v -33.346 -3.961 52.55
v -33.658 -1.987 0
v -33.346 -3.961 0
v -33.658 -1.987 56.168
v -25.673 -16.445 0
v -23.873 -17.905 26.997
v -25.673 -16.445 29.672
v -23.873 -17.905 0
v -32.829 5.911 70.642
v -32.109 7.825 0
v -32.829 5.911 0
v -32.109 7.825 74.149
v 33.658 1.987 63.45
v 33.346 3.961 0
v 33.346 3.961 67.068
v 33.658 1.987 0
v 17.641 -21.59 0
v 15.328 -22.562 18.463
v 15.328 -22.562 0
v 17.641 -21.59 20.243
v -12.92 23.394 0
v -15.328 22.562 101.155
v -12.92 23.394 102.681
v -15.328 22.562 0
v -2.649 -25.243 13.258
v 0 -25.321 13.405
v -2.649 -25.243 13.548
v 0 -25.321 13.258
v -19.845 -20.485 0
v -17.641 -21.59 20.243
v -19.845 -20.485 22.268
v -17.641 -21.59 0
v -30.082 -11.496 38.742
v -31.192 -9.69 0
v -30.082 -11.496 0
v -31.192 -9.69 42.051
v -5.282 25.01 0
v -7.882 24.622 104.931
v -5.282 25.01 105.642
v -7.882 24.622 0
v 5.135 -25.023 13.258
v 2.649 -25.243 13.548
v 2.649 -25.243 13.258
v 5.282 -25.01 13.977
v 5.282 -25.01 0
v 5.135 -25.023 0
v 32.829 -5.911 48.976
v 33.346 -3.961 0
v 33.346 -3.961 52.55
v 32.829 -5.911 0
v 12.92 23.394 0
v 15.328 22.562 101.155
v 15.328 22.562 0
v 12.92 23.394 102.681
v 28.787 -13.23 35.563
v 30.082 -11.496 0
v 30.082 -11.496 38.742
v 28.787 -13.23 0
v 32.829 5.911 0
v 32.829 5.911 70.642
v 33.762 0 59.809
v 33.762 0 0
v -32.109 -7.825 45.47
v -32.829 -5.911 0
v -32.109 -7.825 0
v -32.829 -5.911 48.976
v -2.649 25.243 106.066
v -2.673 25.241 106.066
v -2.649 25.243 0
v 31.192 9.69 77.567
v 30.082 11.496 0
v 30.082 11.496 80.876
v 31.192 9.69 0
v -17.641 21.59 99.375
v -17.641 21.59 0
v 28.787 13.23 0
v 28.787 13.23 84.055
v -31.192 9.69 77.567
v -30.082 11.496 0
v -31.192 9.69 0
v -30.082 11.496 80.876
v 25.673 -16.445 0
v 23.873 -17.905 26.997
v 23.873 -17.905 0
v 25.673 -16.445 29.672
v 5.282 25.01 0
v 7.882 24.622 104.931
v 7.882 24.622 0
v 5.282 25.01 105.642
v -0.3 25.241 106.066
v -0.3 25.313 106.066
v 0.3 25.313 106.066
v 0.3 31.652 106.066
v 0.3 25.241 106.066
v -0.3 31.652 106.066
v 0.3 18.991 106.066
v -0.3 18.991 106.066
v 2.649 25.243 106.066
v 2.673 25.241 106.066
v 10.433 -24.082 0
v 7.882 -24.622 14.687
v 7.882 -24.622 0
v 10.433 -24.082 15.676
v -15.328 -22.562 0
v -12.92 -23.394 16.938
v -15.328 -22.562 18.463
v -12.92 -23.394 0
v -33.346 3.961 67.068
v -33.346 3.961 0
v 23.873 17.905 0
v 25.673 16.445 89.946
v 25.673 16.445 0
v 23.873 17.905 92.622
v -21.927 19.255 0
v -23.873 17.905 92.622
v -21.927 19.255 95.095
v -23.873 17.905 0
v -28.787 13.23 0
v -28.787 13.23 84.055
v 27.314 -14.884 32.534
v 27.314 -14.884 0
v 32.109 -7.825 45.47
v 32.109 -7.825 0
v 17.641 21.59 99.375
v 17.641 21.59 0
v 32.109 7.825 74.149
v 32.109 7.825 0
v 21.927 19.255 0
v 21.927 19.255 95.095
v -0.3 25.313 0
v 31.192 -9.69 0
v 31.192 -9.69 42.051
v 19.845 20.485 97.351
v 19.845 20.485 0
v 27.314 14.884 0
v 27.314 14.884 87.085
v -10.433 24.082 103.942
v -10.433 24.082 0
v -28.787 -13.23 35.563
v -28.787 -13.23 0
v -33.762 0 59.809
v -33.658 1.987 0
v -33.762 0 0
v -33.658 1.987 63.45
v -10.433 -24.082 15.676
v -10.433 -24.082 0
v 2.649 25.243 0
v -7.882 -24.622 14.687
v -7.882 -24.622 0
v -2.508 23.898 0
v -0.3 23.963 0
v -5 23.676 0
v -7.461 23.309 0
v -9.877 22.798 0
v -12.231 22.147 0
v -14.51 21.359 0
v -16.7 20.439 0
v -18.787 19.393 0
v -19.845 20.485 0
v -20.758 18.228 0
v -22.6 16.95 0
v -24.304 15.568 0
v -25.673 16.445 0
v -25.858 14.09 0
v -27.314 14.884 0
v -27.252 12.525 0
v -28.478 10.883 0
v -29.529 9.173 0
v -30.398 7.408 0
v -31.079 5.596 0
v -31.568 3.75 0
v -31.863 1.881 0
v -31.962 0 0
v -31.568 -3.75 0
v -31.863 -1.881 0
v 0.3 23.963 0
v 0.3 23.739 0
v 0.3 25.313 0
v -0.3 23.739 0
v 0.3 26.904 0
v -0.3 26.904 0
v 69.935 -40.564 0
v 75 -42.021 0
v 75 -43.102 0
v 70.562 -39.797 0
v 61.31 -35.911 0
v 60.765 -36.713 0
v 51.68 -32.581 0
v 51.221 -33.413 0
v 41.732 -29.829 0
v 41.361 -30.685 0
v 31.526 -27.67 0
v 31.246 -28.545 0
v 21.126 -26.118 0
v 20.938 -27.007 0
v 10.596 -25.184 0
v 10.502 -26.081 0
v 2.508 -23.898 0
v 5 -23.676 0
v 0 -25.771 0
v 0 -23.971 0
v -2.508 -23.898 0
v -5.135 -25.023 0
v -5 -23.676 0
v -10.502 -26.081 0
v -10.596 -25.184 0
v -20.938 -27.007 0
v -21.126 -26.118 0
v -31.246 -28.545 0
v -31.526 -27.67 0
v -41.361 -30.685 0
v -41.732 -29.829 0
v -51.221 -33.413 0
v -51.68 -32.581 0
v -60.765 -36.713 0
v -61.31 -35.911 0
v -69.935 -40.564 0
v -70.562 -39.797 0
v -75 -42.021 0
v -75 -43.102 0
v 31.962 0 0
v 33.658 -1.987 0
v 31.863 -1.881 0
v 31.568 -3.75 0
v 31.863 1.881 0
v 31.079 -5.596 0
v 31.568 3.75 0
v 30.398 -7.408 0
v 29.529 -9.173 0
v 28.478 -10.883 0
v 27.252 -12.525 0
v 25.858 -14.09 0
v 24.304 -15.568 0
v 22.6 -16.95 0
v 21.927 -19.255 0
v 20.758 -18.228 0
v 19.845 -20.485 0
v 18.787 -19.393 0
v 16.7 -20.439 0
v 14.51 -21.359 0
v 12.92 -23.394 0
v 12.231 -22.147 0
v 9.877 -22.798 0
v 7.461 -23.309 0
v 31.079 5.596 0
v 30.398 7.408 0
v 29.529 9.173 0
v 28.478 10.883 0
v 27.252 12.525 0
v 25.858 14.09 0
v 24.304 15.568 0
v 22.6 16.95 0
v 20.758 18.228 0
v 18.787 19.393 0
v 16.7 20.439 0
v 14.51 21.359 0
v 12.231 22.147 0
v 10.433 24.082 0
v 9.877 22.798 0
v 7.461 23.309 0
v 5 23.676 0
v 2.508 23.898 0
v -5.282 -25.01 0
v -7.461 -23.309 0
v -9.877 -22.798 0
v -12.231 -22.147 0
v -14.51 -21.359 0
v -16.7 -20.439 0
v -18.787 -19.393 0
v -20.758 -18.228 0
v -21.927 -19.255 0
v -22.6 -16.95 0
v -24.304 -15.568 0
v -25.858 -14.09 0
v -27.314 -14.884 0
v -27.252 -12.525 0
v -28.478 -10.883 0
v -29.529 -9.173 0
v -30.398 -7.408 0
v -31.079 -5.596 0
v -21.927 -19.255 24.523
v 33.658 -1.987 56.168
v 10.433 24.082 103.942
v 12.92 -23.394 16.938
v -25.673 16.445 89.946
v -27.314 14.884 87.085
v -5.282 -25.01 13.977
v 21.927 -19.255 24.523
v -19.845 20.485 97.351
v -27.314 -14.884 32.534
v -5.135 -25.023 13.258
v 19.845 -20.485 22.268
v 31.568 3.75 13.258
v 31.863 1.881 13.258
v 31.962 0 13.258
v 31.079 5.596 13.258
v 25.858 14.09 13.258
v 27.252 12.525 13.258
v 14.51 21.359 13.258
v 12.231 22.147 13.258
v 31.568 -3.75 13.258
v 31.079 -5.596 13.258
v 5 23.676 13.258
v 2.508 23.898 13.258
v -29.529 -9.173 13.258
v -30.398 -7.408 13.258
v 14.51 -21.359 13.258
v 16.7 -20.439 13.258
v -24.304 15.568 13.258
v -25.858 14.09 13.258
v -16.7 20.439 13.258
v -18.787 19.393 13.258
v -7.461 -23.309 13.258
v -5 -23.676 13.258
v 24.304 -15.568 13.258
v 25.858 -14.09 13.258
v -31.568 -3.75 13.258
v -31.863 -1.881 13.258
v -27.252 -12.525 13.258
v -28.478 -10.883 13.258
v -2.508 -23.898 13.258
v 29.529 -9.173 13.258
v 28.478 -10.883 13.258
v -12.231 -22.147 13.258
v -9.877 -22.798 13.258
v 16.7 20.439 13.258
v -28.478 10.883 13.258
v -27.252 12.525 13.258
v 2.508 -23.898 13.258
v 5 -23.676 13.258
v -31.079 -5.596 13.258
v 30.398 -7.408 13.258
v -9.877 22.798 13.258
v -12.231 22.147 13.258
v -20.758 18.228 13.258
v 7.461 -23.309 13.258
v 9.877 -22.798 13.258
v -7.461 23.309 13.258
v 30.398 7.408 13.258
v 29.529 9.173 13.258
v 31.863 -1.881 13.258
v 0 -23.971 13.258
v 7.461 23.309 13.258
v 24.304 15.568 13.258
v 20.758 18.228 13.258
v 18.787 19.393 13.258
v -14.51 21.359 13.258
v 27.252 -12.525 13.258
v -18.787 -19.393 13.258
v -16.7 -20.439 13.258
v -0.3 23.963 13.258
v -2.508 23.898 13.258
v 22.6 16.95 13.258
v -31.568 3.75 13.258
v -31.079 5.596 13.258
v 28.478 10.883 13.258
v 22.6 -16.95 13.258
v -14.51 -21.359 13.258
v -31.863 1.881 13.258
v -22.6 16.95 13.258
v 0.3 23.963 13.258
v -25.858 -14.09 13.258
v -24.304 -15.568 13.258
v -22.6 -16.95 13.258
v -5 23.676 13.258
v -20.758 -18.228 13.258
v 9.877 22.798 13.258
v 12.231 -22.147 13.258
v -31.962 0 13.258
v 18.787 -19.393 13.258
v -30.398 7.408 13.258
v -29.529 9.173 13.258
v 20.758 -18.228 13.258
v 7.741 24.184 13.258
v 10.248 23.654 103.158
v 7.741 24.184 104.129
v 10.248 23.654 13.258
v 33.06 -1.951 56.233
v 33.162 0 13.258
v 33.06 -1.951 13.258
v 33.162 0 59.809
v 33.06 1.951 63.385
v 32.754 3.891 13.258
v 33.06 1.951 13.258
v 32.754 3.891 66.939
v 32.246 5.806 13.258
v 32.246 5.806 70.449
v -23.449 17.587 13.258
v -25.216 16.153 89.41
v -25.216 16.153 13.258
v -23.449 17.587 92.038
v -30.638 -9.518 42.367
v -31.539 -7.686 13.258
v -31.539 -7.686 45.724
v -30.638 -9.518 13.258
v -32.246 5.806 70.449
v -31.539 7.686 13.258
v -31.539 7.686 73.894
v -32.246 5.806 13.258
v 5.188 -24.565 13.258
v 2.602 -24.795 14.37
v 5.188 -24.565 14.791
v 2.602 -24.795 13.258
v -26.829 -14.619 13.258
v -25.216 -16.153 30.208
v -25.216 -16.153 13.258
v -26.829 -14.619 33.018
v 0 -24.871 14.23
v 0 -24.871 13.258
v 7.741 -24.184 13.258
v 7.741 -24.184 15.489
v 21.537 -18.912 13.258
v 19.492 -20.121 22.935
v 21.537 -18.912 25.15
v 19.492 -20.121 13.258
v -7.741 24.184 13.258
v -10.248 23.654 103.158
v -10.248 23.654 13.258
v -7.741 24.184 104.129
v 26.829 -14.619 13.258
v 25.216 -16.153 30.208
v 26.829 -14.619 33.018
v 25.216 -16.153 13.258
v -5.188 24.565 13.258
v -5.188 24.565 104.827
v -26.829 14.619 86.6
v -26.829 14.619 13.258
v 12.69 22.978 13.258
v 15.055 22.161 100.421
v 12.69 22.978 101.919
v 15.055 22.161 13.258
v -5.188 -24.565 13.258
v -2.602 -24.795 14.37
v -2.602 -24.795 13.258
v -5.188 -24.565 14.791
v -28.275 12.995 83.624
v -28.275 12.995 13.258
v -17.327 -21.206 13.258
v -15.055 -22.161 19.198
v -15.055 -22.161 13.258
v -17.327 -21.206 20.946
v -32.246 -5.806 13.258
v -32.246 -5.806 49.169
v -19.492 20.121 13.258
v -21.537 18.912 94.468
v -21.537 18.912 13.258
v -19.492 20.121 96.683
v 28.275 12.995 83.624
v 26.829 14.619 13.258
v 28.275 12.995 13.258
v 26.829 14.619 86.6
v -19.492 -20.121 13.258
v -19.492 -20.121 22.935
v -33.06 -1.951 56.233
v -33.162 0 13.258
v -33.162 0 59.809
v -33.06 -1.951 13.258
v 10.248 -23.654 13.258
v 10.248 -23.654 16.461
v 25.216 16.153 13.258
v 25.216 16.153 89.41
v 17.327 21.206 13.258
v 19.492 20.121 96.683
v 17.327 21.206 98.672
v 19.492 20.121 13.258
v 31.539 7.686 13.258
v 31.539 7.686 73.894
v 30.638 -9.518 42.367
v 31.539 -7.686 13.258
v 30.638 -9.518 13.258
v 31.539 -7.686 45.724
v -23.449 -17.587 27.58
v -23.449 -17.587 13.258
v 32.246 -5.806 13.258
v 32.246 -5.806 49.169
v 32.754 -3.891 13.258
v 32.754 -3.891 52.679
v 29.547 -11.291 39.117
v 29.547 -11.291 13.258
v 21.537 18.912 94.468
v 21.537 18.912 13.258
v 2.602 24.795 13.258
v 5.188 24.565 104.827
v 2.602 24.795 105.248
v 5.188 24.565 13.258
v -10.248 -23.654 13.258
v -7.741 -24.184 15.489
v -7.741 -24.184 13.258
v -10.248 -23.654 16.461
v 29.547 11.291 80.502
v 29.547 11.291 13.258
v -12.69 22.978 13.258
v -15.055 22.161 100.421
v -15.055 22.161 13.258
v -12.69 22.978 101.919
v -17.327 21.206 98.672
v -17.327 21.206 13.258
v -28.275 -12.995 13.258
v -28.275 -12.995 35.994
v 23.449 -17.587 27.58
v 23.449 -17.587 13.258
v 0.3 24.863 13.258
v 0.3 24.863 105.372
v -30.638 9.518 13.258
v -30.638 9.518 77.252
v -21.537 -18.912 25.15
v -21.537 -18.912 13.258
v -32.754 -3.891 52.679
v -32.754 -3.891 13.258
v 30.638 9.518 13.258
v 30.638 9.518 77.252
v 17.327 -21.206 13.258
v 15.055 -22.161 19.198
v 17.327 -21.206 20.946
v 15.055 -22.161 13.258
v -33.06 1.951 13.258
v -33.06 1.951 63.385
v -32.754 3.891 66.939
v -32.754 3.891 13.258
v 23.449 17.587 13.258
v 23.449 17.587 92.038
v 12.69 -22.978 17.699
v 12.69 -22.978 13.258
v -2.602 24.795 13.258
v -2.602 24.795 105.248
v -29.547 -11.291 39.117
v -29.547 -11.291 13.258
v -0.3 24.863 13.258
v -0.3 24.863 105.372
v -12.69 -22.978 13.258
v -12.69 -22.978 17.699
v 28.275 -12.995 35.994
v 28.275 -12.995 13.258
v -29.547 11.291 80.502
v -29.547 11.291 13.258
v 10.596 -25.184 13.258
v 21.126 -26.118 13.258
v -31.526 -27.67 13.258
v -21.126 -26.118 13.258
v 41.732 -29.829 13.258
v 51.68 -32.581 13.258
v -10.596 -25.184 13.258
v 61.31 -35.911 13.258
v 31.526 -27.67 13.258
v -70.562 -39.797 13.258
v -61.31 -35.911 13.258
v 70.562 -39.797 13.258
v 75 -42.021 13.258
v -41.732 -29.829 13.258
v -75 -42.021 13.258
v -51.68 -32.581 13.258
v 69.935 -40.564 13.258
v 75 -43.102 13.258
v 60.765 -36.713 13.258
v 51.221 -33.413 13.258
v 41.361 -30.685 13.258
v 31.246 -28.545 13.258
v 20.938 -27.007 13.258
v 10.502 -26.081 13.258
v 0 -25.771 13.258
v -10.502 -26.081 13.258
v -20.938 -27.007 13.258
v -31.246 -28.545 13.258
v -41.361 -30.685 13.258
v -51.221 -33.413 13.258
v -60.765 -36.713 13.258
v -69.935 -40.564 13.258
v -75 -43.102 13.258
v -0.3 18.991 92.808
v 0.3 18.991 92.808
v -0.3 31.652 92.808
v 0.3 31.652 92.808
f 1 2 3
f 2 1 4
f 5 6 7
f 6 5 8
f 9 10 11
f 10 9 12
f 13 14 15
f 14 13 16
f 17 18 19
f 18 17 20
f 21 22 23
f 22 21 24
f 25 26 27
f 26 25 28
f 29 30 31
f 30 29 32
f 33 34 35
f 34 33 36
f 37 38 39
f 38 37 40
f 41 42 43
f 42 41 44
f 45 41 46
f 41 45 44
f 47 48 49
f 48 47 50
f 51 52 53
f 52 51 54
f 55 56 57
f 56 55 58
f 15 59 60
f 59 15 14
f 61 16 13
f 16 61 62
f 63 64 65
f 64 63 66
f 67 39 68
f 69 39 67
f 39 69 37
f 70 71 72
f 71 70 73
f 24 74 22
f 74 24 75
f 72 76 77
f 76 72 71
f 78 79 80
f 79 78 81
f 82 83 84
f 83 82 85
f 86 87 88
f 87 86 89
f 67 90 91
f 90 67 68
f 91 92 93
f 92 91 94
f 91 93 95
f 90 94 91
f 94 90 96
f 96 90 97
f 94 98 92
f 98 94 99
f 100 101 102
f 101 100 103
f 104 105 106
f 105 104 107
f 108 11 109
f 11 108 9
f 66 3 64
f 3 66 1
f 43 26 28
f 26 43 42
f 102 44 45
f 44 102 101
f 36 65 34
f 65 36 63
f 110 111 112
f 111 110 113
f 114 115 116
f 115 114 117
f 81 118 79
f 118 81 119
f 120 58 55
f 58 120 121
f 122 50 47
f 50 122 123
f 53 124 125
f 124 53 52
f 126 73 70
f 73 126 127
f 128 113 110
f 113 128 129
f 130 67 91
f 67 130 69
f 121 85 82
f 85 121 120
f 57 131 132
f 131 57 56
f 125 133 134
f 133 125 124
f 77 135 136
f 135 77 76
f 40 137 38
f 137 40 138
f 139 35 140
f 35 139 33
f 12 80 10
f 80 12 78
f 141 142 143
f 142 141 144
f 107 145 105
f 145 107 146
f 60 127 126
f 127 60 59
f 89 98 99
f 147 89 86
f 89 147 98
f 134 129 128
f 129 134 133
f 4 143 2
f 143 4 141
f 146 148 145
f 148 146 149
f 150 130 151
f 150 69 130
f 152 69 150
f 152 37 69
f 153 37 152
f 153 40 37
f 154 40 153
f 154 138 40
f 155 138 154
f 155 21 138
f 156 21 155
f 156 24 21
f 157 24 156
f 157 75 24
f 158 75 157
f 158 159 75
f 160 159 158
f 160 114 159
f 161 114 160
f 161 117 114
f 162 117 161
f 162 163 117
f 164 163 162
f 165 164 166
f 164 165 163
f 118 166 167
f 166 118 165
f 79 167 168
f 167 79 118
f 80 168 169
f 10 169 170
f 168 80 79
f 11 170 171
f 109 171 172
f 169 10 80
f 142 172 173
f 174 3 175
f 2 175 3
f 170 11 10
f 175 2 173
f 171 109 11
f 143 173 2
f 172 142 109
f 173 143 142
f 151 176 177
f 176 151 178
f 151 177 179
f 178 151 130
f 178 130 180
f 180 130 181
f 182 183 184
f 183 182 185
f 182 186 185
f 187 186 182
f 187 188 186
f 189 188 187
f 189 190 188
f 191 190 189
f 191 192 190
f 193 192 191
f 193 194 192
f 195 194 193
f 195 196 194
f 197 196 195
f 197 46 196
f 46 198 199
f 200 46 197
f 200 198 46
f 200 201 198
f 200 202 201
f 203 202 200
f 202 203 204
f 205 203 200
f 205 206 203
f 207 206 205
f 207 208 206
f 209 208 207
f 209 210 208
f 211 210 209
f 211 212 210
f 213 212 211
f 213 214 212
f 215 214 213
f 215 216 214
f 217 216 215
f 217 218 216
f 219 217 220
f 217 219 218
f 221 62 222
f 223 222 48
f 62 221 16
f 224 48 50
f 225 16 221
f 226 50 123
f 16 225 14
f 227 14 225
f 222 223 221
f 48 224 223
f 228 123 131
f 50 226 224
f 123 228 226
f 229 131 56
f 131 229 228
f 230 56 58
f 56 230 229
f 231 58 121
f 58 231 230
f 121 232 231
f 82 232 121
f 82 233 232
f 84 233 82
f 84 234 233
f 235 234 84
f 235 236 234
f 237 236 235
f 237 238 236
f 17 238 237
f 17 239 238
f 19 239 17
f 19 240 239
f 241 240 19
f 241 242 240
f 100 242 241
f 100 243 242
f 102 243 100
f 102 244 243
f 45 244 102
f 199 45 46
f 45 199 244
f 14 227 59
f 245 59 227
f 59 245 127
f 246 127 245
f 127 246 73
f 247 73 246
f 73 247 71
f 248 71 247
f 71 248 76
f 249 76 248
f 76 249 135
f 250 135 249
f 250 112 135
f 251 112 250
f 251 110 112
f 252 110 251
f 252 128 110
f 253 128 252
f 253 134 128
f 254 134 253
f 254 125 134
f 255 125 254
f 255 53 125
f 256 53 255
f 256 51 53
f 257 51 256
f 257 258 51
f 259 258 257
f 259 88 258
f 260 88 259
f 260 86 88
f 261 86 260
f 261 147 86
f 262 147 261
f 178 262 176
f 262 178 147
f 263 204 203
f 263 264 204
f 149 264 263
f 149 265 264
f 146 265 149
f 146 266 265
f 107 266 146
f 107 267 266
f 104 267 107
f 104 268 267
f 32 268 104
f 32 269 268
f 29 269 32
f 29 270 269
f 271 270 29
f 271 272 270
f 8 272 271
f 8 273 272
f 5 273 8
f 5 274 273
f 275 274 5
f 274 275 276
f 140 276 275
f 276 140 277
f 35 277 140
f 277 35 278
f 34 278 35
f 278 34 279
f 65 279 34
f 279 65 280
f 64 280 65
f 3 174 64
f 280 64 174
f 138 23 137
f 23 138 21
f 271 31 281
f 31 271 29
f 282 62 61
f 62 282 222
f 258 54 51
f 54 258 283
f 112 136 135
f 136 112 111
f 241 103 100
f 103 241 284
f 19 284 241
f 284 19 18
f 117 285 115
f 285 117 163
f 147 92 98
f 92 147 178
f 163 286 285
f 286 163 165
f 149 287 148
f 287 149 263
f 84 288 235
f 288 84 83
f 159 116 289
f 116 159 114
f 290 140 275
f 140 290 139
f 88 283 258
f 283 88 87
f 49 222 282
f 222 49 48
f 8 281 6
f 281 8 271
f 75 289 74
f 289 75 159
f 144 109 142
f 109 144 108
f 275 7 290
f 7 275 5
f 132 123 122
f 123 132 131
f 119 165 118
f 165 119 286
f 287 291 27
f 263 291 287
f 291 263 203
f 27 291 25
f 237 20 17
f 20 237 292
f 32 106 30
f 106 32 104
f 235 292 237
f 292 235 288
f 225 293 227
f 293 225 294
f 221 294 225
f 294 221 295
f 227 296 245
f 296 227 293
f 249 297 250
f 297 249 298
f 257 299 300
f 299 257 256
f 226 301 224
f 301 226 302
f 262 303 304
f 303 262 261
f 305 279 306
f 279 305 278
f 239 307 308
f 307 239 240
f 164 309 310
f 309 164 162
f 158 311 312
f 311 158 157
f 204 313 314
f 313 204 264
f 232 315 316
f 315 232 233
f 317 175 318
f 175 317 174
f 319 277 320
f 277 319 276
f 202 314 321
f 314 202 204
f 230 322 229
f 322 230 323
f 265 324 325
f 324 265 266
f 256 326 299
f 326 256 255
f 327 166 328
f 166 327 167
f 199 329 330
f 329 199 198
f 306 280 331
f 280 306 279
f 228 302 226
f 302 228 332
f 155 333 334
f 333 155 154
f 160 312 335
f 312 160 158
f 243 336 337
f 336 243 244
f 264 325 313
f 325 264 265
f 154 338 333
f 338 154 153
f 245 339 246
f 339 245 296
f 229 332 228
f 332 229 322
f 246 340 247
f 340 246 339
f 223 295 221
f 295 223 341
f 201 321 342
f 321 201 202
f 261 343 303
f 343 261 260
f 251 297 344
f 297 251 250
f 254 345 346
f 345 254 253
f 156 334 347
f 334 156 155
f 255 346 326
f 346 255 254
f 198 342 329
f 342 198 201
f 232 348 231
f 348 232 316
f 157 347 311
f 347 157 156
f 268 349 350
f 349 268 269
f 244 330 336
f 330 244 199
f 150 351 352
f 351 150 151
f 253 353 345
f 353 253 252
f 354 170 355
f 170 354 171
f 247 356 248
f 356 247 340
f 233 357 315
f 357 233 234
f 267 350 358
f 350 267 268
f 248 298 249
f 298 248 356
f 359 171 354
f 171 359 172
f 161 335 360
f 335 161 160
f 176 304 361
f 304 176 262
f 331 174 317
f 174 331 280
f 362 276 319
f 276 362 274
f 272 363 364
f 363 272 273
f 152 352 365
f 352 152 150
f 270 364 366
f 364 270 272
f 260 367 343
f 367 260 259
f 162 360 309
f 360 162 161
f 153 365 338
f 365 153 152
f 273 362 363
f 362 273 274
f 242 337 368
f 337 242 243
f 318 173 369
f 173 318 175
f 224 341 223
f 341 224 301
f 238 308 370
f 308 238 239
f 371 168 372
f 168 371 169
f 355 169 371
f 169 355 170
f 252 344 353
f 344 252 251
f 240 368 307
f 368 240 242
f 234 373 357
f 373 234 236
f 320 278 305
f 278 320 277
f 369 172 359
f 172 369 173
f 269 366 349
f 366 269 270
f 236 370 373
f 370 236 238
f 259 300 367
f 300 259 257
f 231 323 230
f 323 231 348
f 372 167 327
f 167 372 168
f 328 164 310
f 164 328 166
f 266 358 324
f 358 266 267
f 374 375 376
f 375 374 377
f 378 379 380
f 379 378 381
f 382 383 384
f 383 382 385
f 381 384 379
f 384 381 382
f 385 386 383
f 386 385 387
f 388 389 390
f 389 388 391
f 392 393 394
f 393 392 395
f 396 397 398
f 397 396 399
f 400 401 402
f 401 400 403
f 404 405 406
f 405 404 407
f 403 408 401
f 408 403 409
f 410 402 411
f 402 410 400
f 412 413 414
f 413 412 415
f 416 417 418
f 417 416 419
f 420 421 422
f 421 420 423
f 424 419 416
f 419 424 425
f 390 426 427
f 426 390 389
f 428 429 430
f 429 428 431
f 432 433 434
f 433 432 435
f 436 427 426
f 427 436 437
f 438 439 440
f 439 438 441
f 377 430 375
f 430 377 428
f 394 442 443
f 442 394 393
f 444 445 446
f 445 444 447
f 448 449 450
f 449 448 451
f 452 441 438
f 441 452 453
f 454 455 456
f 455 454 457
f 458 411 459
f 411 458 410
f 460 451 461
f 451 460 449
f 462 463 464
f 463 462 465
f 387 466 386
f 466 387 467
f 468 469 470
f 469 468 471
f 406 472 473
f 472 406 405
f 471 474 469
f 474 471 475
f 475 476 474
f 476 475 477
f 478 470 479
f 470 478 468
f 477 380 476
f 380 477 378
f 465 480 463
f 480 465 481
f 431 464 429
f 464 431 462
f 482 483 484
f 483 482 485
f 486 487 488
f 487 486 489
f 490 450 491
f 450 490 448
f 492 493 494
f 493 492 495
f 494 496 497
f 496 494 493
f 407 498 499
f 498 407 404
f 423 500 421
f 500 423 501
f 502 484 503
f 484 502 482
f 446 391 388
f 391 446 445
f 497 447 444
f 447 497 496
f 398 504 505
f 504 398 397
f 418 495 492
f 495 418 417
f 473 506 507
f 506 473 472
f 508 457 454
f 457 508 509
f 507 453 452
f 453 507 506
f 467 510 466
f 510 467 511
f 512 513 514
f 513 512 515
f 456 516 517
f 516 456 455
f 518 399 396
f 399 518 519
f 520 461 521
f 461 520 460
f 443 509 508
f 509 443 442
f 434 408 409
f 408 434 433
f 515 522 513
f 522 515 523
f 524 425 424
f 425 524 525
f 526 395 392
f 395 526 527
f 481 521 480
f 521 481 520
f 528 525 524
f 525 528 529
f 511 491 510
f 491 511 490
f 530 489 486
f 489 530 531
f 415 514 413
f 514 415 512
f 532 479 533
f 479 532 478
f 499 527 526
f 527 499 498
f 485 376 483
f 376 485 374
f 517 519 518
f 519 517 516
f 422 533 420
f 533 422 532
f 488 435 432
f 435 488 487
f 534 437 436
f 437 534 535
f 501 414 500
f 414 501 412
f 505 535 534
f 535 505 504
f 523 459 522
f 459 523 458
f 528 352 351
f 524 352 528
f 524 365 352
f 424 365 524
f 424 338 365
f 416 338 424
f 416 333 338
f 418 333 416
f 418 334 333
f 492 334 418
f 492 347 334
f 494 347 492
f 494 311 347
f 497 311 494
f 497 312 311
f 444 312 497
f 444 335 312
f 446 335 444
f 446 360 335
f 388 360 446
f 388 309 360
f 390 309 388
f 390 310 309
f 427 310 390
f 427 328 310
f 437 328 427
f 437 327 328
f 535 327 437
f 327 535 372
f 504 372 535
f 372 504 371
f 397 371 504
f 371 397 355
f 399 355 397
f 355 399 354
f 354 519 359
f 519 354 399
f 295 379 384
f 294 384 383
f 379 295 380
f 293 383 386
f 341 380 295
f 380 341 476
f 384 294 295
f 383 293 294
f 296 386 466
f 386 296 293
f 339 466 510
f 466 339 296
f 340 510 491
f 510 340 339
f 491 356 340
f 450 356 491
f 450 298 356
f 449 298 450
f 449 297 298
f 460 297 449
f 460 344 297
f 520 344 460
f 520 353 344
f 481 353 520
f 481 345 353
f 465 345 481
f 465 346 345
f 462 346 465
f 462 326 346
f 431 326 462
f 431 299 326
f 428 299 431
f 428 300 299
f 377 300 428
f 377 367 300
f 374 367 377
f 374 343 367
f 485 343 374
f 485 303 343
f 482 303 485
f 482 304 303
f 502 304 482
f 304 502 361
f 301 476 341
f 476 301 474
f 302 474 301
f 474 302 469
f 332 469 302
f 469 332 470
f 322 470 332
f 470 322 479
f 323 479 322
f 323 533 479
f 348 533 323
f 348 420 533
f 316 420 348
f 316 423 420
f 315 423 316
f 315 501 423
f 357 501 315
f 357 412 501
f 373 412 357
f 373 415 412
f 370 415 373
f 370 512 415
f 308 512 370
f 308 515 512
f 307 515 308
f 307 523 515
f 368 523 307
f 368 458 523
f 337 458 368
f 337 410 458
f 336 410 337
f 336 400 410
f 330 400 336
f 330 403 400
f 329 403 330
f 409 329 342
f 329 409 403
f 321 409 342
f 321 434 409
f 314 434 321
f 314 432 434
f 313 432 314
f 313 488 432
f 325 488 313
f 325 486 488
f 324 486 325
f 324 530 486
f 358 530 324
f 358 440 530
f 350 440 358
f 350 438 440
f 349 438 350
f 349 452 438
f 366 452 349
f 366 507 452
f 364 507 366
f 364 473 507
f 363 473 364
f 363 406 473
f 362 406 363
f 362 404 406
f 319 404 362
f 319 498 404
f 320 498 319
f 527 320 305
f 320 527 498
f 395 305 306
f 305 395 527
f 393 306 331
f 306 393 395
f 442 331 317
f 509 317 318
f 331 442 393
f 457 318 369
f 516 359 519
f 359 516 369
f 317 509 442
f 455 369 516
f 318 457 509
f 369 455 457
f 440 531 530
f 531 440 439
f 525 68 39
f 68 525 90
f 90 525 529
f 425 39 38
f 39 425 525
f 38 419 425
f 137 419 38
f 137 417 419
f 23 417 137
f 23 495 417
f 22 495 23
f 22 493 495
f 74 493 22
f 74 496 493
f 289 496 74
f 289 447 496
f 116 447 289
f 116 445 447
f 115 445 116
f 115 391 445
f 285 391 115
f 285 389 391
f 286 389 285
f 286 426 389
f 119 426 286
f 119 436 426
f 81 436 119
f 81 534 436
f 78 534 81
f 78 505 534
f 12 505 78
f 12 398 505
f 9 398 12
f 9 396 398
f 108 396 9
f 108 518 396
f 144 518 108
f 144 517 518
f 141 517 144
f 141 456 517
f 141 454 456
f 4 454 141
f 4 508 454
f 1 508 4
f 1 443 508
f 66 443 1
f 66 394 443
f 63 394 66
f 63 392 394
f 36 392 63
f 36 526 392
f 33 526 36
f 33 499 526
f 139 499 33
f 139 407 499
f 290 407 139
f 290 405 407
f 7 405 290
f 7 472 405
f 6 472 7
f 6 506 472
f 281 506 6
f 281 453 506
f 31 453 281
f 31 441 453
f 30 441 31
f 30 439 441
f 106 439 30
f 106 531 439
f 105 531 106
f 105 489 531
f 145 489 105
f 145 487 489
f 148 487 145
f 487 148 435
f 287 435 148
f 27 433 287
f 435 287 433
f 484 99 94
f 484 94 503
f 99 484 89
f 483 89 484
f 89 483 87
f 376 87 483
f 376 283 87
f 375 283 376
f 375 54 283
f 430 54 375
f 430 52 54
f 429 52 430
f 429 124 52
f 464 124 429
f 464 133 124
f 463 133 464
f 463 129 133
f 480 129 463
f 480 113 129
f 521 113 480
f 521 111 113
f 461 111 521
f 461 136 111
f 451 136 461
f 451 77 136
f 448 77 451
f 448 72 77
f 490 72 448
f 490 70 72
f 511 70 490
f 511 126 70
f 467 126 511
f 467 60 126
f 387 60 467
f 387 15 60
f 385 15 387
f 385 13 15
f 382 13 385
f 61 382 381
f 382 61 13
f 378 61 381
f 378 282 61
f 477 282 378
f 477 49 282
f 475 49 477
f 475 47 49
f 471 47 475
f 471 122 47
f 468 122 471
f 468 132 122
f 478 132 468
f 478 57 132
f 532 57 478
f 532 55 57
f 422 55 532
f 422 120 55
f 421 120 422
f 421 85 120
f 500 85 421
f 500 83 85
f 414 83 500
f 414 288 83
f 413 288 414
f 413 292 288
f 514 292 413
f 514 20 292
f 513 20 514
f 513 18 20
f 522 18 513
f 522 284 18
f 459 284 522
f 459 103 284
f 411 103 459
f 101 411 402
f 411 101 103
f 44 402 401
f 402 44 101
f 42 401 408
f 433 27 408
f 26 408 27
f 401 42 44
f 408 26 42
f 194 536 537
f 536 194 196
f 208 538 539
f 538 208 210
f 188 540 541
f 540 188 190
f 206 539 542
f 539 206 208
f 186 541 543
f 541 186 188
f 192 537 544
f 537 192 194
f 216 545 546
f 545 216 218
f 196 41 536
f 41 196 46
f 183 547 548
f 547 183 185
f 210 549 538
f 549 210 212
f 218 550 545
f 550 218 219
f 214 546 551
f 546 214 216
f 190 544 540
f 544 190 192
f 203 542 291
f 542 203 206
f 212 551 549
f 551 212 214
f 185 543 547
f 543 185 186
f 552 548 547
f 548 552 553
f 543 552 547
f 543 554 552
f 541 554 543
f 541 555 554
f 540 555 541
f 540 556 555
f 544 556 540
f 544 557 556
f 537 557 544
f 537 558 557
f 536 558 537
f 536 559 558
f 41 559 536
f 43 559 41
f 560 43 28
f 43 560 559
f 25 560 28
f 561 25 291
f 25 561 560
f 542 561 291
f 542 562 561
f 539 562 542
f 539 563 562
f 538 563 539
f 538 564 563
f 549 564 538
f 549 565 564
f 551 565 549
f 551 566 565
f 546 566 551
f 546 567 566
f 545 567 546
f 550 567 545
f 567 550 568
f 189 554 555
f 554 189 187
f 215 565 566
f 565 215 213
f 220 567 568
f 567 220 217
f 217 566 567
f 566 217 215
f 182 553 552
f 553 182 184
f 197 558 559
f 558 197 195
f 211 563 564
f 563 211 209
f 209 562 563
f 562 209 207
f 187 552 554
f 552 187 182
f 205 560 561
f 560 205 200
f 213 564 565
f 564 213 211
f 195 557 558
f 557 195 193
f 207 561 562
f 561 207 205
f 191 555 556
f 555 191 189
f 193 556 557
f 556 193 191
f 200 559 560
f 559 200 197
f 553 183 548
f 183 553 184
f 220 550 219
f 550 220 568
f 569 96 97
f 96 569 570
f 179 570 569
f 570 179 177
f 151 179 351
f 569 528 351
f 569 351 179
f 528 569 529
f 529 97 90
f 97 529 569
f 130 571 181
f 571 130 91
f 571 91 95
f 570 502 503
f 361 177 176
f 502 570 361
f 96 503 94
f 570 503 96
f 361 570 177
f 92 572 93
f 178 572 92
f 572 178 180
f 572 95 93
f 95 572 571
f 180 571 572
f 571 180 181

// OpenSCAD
/*

Jim Gile
Ring Flyer

*/

$fn= 80; // Smoothness setting

tk = .6;
base = 150;
cir = sqrt(pow(base,2)+pow(base,2));
rad = cir/(2*PI);
diam = 2*rad;
ht = cir/2;
minHt = ht/8;
sliceAngle = atan2(ht-minHt,diam);
//echo("cir=",cir,"ht=",ht,"minHt=",minHt);

scale([1,.75,1]) {
    //Main Cylinder
    difference() {
        cylinder(r=rad,h=ht,center=false);
        translate([0,0,-1])cylinder(r=rad-(3*tk),h=ht+2,center=false);
        translate([0,0,minHt])cylinder(r=rad-tk,h=ht,center=false);
        translate([0,-base/8,rad+(2*minHt)+base/4])rotate([sliceAngle,0,0])
            cube([diam+2,base*1.1,base/2],center=true);

    }
    //Upper Wing
    difference() {
        translate([0,tk-(diam*2)-rad,0])cylinder(r=diam*2,h=minHt,center=false);
        translate([0,tk-(diam*2)-rad,-1])cylinder(r=(diam-tk)*2,h=minHt+2,center=false);
        translate([diam*2+base/2,-diam*2.5,minHt/2])cube([diam*4,diam*4,minHt*2],center=true);
        translate([-diam*2-base/2,-diam*2.5,minHt/2])cube([diam*4,diam*4,minHt*2],center=true);
        translate([0,-diam*3,minHt/2])cube([diam*4,diam*4,minHt*2],center=true);
    }
    //Rudder
    hull() {
        translate([0,rad,minHt/2])cube([tk,rad/8,minHt],center=true);
        translate([0,rad,ht-minHt/2])cube([tk,rad/2,minHt],center=true);
    }    
}
